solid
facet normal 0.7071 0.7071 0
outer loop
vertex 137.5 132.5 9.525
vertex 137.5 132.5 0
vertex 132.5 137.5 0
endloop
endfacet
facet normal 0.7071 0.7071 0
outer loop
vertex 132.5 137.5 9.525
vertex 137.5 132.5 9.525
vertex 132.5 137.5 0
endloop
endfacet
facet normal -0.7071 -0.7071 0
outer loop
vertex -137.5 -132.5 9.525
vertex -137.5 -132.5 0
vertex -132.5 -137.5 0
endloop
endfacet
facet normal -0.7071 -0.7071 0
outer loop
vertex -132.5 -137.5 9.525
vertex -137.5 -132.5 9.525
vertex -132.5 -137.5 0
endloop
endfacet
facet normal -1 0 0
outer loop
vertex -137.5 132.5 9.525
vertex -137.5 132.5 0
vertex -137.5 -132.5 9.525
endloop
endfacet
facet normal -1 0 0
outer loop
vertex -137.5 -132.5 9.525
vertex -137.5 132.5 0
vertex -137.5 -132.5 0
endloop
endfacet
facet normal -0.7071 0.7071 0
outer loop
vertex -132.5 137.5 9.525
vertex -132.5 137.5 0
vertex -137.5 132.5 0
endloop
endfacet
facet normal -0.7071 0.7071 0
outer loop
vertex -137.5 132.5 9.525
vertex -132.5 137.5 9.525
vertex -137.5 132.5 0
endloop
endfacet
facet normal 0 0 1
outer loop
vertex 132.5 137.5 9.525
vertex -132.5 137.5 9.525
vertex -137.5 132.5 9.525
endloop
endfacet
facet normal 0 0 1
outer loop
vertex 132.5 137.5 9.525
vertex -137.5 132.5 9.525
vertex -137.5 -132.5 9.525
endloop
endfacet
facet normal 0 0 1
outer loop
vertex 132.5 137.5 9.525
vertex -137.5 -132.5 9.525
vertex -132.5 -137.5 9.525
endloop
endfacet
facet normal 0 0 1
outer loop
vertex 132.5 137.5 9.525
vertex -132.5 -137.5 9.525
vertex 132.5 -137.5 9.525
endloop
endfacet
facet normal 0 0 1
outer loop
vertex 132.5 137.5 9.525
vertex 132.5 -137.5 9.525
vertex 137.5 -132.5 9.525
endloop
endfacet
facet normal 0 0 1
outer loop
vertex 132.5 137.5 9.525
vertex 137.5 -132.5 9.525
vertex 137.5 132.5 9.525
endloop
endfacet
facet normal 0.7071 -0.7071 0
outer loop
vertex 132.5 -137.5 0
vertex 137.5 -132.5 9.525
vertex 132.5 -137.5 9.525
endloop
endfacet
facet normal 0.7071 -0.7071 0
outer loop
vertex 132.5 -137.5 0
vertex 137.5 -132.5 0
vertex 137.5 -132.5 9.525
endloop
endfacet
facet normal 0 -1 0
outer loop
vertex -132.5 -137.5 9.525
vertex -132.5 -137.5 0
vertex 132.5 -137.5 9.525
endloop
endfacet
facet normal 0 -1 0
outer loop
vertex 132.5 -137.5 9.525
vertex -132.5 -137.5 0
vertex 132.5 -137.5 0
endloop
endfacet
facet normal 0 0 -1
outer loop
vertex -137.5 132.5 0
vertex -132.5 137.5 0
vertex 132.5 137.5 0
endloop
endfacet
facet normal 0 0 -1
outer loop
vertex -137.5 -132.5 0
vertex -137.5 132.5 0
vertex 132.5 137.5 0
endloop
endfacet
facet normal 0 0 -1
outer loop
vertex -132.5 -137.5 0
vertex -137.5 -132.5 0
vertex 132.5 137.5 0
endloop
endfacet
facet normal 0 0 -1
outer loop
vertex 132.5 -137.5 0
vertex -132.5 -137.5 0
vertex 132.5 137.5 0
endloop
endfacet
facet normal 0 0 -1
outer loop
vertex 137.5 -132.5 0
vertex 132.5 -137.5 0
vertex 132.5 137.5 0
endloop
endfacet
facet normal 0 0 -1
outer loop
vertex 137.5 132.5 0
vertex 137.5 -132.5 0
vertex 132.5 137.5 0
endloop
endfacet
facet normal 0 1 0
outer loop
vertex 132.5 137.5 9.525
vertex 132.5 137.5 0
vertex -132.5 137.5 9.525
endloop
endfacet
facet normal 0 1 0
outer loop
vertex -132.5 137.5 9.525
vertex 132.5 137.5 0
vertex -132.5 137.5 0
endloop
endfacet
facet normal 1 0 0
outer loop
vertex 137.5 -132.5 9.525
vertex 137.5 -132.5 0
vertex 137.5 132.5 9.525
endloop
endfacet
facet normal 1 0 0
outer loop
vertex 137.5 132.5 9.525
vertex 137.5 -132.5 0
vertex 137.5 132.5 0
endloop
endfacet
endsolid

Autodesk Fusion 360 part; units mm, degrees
sketch "Sketch1" plane through (0, 0, 0) normal (0, 0, 1) x (1, 0, 0)
  line L0 (132.5, 137.5) -> (-132.5, 137.5)
  line L1 (-137.5, 132.5) -> (-137.5, -132.5)
  line L2 (-132.5, -137.5) -> (132.5, -137.5)
  line L3 (137.5, -132.5) -> (137.5, 132.5)
  line L4 (135, 135) -> (-137.5, -137.5) construction
  line L5 (-137.5, 137.5) -> (135, -135) construction
  line L6 (137.5, 132.5) -> (132.5, 137.5)
  line L7 (-137.5, -132.5) -> (-132.5, -137.5)
  line L8 (-132.5, 137.5) -> (-137.5, 132.5)
  line L9 (137.5, -132.5) -> (132.5, -137.5)
  dimension "d2" = 275
  dimension "d5" = 5
  dimension "d6" = 5
  dimension "d7" = 5
  dimension "d8" = 5
  dimension "d9" = 5
  dimension "d10" = 5
extrude "Extrude1" add sketch "Sketch1" along normal blind 9.525
equation "d11 = 3 / 8 * in"
